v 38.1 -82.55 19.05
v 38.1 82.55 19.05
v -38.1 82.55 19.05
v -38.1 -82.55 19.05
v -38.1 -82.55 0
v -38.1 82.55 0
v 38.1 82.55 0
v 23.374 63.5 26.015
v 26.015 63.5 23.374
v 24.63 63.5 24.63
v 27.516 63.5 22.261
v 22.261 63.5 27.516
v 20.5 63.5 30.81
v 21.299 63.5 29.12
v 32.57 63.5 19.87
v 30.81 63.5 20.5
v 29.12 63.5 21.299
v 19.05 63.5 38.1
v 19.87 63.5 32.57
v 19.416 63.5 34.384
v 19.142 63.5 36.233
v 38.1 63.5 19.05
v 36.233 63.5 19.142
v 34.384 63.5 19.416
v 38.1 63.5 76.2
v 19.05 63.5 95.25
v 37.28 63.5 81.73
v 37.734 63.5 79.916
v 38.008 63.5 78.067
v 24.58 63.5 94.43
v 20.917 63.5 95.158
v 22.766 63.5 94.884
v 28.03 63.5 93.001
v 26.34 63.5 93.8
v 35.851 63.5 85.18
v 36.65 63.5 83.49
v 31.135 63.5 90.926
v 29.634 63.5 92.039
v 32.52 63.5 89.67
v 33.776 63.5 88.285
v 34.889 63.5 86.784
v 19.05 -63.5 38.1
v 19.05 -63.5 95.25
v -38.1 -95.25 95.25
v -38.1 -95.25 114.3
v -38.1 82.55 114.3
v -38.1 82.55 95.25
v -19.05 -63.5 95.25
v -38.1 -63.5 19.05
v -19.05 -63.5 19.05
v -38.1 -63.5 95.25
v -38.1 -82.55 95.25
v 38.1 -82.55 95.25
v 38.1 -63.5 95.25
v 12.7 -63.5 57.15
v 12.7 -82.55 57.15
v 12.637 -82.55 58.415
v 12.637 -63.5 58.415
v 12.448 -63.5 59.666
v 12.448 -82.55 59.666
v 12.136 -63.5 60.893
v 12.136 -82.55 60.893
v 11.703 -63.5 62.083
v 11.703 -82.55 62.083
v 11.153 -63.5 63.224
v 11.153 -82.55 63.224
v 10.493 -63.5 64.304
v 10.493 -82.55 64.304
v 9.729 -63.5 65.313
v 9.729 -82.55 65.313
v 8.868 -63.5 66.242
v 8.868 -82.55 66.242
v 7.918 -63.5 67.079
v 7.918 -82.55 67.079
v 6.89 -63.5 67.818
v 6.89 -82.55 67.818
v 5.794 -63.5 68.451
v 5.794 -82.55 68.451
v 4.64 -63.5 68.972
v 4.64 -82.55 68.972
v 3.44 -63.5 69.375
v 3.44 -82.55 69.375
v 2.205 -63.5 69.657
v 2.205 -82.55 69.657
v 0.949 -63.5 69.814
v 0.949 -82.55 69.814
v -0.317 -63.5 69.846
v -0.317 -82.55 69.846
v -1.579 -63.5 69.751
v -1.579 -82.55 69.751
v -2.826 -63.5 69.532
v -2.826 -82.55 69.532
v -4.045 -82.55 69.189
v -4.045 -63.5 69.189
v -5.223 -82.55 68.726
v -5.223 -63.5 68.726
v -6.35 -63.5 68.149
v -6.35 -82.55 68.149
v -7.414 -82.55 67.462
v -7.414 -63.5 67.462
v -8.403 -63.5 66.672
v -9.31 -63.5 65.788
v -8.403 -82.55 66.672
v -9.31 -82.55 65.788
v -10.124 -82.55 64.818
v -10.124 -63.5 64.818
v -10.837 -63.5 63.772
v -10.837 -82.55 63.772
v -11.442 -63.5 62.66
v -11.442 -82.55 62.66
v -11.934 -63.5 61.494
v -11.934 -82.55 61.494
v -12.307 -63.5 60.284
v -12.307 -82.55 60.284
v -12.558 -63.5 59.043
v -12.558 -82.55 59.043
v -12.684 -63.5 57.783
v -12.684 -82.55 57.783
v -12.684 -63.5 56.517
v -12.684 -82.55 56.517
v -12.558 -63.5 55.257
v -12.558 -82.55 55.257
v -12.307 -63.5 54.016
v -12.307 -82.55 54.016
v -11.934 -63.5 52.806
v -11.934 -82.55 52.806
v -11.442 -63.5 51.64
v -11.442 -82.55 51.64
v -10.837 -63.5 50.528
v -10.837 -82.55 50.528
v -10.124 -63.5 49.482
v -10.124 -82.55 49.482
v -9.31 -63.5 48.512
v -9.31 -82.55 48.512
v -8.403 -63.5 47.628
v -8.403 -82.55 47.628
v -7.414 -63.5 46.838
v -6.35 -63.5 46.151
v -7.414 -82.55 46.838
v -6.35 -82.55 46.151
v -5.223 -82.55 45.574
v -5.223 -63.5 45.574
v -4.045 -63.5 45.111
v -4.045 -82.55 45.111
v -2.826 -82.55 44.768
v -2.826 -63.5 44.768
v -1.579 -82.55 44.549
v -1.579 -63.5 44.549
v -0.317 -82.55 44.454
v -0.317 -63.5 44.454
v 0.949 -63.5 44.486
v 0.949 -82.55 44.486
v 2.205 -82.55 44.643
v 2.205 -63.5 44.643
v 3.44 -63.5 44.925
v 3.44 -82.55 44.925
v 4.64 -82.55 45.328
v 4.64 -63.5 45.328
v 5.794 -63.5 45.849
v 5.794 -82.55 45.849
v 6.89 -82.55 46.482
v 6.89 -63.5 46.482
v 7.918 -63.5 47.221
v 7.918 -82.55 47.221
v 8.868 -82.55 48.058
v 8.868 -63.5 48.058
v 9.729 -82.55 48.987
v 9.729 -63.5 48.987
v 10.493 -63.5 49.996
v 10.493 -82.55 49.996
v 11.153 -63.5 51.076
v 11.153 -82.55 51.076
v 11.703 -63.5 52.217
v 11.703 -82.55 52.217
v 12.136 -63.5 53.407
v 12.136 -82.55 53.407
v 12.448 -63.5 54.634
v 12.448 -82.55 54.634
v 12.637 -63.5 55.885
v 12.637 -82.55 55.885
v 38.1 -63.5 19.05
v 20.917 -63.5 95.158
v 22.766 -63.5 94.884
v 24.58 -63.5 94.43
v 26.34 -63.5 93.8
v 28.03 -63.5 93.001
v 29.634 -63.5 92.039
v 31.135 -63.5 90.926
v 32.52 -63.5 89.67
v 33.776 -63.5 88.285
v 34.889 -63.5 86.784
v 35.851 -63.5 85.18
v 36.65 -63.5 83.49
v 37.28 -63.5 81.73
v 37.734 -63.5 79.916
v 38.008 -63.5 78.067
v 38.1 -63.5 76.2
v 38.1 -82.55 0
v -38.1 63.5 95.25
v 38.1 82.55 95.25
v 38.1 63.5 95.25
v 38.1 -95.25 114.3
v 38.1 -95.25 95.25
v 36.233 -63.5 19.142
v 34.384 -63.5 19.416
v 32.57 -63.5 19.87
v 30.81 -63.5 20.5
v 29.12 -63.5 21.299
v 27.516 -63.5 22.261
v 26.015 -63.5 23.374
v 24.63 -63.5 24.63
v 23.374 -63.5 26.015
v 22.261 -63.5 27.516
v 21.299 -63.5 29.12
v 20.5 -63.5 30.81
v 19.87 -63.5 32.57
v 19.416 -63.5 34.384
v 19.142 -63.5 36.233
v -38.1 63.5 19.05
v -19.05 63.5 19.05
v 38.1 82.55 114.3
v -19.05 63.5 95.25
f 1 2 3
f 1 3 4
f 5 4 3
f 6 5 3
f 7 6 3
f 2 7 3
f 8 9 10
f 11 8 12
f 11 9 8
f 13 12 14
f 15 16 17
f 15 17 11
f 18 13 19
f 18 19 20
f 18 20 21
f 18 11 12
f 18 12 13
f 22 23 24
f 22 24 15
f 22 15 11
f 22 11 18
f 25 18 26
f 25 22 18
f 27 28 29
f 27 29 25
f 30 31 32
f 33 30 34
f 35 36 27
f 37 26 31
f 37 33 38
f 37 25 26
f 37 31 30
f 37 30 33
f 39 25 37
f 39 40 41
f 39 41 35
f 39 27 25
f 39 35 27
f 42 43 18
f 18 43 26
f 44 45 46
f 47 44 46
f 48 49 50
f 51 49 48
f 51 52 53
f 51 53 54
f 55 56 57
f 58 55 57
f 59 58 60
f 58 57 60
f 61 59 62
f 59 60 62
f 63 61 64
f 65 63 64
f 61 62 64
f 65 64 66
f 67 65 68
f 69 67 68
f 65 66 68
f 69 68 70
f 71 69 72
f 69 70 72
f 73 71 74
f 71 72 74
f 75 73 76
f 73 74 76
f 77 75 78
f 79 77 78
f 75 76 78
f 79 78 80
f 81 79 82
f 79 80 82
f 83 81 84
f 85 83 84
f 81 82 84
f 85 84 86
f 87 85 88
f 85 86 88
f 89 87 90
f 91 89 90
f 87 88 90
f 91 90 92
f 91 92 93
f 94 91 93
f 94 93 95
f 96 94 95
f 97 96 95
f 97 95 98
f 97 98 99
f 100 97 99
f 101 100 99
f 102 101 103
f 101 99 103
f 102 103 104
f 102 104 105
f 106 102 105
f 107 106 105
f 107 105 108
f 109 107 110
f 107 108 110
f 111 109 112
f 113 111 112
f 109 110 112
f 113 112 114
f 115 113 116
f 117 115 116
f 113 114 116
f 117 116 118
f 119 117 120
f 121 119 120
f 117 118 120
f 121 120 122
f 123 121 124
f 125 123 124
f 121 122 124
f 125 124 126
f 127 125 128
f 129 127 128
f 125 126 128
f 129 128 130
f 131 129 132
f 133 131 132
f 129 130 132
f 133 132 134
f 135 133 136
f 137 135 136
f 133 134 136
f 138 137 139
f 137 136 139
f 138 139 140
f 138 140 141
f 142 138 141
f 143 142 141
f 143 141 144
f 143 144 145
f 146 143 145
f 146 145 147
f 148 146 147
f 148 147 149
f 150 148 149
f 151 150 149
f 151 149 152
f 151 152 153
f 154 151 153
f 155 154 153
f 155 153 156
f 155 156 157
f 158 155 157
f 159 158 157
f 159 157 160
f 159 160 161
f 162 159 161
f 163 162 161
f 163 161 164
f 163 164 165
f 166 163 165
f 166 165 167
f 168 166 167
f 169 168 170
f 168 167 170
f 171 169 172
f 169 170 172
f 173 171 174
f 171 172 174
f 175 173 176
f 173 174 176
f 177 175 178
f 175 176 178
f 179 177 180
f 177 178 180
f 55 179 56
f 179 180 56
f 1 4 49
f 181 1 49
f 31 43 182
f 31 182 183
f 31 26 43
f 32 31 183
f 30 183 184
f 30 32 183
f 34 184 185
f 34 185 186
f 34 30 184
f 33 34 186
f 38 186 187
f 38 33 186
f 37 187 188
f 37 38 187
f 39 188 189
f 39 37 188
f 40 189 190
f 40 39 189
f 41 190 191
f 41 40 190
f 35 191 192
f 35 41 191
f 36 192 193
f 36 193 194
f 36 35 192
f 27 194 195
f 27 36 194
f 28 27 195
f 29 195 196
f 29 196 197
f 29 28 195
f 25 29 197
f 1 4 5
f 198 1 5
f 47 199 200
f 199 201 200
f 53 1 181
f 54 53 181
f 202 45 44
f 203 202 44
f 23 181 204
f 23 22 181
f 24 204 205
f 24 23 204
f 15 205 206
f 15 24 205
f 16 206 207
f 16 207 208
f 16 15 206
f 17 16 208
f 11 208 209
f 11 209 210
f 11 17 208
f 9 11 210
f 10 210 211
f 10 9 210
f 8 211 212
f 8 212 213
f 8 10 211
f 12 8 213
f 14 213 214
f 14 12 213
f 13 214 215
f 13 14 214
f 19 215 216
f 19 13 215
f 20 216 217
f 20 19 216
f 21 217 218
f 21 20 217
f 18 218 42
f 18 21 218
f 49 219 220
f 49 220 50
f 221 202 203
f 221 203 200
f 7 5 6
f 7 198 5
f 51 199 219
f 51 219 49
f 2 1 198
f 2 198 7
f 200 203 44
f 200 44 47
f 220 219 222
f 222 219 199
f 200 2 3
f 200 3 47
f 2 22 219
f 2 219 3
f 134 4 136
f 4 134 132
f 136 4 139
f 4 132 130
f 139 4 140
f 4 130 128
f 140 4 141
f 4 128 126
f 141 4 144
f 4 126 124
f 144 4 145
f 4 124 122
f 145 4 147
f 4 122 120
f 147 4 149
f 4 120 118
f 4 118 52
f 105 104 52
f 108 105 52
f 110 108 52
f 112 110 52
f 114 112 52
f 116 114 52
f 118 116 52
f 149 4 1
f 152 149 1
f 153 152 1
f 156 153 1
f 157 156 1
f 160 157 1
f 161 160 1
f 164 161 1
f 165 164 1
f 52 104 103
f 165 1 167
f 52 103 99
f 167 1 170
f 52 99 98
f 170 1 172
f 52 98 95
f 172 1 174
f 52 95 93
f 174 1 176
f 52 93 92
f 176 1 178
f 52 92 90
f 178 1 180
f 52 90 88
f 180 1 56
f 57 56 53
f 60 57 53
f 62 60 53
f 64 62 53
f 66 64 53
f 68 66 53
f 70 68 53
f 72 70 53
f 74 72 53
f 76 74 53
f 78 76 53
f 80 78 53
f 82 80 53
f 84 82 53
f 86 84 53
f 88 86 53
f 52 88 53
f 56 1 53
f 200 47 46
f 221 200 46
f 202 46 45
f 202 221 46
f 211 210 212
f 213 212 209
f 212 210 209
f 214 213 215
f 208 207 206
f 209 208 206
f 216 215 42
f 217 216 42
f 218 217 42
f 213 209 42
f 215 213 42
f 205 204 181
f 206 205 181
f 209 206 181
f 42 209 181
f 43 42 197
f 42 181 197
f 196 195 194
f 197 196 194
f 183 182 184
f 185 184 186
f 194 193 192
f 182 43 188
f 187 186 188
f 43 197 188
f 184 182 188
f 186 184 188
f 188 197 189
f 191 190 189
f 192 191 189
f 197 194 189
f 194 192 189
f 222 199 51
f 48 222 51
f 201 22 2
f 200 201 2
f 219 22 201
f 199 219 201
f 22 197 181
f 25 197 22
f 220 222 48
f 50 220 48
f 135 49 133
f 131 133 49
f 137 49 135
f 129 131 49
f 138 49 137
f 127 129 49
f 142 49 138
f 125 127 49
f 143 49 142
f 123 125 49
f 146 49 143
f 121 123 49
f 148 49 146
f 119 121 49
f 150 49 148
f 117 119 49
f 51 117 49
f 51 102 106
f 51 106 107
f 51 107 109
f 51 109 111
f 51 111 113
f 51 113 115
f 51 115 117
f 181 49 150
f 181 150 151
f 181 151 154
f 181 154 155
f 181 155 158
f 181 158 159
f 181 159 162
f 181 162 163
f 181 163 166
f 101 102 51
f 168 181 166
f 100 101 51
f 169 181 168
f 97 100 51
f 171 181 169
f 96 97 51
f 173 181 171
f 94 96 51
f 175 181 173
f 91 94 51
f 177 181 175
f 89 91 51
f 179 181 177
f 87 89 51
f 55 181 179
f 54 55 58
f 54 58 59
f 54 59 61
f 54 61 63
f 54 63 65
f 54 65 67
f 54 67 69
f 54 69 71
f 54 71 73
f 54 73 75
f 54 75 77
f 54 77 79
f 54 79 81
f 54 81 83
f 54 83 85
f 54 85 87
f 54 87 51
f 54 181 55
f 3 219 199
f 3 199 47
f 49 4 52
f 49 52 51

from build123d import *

# Parameters (mm, degrees)
F2_DEPTH  = 38.1
F1_W      = 19.05
F1_H      = 76.2
F3_DEPTH  = 38.1
F4_DEPTH  = 38.1
F5_DEPTH  = 38.1
F6_R      = 12.7
F7_DEPTH  = 19.05
F8_W      = 127
F8_H      = 76.2
F9_DEPTH  = 19.05
F10_W     = 127
F10_H     = 76.2
F11_DEPTH = 19.05
F12_R     = 19.04999


# Not quite as in the source:
# - a variable given as a bare number and used for a length is read in inches; the dataset says mm whatever the document's units were
# - a fillet or chamfer is up to 0.001 mm smaller than in the source, because OpenCascade refuses the exact size
# - a feature names something its author has since deleted; it is built from what else it names


with BuildPart() as f2:
    # F1 (on Right) → F2 (new body, symmetric)
    with BuildSketch(Plane.YZ):
        Polygon((82.55, 0), (82.55, 19.05), (63.5, 19.05), (-63.5, 19.05), (-82.55, 19.05), (-82.55, 0), align=None)
    extrude(amount=F2_DEPTH, both=True)


with BuildPart() as f3:
    # F1 (on Right) → F3 (new body, symmetric)
    with BuildSketch(Plane.YZ):
        with Locations((73.025, 57.15)):
            Rectangle(F1_W, F1_H)
    extrude(amount=F3_DEPTH, both=True)


with BuildPart() as f4:
    # F1 (on Right) → F4 (new body, symmetric)
    with BuildSketch(Plane.YZ):
        Polygon((82.55, 114.3), (-95.25, 114.3), (-95.25, 95.25), (-82.55, 95.25), (-63.5, 95.25), (63.5, 95.25), (82.55, 95.25), align=None)
    extrude(amount=F4_DEPTH, both=True)


with BuildPart() as f5:
    # F1 (on Right) → F5 (new body, symmetric)
    with BuildSketch(Plane.YZ):
        with Locations((-73.025, 57.15)):
            Rectangle(F1_W, F1_H)
    extrude(amount=F5_DEPTH, both=True)

    # F6 (on face) → F7 (cut, through all)
    with BuildSketch(Plane.XZ.offset(82.55)):
        with Locations((0, 57.15)):
            Circle(F6_R)
    extrude(amount=-F7_DEPTH, mode=Mode.SUBTRACT)


with BuildPart() as f9:
    # F8 (on face) → F9 (new body)
    with BuildSketch(Plane(origin=(-38.1, 0, 0), x_dir=(0, -1, 0), z_dir=(-1, 0, 0))):
        with Locations((0, 57.15)):
            Rectangle(F8_W, F8_H)
    extrude(amount=-F9_DEPTH)


with BuildPart() as f11:
    # F10 (on face) → F11 (new body)
    with BuildSketch(Plane.YZ.offset(38.1)):
        with Locations((0, 57.15)):
            Rectangle(F10_W, F10_H)
    extrude(amount=-F11_DEPTH)

    # F12 (radius 19.05 in the source; OpenCascade refuses exactly that, so slightly less here)
    f12_edges = [f11.edges().sort_by_distance(p)[0] for p in [
        (38.1, 0, 95.25),
        (19.05, 0, 19.05),
    ]]
    fillet(f12_edges, radius=F12_R)


solid = Compound([f2.part, f3.part, f4.part, f5.part, f9.part, f11.part])
